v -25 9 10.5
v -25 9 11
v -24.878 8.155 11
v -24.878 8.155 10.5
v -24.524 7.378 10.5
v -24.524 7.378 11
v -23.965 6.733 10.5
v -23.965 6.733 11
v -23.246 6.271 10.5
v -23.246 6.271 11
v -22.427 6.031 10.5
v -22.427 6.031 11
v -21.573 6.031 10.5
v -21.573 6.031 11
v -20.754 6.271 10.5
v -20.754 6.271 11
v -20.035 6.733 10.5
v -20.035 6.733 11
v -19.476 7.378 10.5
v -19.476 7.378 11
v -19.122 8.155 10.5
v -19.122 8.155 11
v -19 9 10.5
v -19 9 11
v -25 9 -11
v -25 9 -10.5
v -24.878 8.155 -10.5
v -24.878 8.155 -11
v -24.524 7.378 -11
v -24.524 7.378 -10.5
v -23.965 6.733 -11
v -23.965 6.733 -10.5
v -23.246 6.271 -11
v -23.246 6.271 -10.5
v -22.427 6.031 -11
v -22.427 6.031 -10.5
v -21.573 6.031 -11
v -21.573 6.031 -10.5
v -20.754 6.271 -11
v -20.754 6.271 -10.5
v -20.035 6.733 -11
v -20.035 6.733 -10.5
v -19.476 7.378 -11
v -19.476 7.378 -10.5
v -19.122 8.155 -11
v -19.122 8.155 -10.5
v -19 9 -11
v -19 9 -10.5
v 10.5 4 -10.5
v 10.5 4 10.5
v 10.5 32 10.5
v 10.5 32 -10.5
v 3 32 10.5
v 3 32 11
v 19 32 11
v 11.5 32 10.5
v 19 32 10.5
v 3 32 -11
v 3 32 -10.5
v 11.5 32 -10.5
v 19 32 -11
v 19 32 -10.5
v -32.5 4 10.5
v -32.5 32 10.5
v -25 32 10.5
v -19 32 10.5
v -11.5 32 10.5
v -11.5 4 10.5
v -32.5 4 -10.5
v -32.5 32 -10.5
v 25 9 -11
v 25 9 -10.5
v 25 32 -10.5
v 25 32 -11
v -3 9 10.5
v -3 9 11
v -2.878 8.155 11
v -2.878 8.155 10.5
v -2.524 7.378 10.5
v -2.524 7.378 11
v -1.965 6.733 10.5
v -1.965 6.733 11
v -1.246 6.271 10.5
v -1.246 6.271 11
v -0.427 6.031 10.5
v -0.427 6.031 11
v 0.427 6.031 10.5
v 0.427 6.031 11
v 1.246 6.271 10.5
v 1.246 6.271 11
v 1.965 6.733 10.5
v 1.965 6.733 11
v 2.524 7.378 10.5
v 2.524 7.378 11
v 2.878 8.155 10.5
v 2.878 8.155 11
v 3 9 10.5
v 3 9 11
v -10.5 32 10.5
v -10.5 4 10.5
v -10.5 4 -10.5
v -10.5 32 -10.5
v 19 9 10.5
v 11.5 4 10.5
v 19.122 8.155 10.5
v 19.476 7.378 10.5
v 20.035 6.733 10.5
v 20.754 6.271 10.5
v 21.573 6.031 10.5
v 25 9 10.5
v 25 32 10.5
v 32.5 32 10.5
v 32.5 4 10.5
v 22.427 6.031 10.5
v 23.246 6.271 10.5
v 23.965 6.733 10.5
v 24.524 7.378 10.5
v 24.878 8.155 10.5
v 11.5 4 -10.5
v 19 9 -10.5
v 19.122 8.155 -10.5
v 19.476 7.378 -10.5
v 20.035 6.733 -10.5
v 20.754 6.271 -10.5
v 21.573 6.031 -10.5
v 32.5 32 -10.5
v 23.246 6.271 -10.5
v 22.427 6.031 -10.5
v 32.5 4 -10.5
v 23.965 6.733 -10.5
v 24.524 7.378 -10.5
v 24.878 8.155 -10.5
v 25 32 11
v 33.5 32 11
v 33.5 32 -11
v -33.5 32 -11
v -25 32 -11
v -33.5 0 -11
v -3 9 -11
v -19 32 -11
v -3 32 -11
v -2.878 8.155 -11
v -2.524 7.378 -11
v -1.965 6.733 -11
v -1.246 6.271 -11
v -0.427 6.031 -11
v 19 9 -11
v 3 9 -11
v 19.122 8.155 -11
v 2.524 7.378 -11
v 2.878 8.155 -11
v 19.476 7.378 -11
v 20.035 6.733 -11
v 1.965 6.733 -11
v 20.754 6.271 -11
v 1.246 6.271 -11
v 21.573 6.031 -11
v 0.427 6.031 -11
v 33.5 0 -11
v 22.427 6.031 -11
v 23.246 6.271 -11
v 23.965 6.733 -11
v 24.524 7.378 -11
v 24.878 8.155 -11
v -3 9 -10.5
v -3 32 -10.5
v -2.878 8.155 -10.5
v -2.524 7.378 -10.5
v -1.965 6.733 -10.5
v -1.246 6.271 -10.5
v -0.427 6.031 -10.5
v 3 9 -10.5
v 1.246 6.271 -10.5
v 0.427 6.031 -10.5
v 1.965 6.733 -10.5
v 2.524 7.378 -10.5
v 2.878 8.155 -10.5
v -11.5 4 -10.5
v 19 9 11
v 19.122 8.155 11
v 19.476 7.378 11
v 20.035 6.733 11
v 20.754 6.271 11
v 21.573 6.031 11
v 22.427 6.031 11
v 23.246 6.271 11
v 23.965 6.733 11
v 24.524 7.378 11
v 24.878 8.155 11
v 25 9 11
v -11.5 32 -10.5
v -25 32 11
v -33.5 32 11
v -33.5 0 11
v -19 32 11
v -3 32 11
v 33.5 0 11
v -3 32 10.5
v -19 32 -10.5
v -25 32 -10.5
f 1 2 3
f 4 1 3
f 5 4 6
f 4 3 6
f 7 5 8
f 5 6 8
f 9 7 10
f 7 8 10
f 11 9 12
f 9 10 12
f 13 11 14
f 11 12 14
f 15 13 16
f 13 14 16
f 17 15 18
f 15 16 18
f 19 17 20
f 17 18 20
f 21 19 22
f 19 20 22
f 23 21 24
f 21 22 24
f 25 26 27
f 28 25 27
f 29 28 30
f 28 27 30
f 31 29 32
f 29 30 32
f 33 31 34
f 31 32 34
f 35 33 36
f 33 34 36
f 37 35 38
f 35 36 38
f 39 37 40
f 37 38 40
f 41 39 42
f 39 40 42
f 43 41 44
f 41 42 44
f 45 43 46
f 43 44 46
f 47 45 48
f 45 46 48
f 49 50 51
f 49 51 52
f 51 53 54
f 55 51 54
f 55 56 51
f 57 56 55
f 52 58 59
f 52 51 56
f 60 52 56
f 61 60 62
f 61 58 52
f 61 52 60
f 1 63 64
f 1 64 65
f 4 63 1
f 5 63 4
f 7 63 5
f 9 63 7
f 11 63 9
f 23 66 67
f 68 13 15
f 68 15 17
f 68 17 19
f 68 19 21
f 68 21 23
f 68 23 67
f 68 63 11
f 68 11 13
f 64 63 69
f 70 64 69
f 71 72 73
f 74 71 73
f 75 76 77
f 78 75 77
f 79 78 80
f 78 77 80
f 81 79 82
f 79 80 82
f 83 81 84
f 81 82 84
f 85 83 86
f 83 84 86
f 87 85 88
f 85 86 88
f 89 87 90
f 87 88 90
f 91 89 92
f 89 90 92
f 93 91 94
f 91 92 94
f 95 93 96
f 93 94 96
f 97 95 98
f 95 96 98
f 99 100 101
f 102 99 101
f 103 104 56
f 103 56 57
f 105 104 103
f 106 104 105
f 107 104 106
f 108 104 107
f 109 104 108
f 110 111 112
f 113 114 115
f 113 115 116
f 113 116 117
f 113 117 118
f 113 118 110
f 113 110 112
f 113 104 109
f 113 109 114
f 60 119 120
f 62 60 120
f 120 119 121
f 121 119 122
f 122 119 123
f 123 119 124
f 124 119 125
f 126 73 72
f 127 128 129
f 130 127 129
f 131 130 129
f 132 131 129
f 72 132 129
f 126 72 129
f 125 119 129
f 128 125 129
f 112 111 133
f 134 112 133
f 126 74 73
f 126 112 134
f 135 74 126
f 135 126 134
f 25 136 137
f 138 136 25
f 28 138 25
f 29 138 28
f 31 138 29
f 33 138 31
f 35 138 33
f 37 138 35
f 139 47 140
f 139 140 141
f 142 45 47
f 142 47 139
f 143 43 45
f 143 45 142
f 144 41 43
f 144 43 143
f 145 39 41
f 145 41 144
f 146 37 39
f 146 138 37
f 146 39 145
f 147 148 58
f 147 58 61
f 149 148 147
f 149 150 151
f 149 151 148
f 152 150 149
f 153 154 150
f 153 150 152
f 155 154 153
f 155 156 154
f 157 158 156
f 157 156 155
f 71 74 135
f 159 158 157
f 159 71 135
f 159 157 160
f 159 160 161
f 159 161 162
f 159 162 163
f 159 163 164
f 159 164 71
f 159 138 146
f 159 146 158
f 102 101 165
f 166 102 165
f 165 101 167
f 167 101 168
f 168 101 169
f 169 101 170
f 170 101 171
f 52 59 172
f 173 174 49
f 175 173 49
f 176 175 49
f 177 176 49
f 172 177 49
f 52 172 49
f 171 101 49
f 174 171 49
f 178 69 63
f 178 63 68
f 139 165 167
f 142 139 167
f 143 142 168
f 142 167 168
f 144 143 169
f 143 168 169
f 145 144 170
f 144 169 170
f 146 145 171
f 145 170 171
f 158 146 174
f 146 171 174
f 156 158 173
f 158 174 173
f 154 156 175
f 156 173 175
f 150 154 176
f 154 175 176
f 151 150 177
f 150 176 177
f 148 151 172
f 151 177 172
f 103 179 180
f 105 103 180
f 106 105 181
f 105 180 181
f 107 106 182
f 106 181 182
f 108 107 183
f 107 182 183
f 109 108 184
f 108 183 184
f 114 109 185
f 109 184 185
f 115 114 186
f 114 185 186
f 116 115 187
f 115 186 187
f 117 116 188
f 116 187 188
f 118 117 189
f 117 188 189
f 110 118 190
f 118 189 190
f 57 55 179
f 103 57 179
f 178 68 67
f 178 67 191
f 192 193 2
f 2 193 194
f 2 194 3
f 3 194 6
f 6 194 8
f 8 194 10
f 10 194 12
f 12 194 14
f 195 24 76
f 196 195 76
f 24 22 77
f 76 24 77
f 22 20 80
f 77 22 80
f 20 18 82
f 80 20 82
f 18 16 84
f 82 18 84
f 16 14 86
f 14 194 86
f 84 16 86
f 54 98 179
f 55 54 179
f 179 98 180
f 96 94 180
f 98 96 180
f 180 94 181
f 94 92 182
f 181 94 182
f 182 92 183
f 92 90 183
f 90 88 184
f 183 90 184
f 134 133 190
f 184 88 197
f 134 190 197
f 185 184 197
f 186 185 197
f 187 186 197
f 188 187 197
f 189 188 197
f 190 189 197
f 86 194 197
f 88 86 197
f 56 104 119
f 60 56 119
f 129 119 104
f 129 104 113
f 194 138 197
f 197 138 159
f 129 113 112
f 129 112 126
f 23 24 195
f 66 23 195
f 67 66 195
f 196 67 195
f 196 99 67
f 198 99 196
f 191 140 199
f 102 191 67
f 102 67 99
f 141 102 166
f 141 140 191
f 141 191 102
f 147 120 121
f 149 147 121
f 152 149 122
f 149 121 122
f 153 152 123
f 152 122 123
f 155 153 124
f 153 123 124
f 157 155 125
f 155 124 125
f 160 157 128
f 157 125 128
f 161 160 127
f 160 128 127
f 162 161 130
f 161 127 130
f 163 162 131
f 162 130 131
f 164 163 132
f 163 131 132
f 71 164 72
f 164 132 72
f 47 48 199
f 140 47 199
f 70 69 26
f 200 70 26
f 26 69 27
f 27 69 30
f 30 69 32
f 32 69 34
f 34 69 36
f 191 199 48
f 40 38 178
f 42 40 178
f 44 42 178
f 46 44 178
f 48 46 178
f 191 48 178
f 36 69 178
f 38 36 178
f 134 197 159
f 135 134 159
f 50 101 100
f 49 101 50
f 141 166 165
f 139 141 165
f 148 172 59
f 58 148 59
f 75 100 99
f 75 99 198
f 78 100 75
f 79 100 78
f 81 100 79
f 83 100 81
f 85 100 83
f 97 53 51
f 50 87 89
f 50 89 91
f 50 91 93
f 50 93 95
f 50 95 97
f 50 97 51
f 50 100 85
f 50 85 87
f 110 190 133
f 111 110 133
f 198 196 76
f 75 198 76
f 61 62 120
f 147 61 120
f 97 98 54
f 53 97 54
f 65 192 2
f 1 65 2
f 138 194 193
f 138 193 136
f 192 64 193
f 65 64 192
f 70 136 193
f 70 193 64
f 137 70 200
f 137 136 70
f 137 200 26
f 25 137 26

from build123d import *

# Parameters (mm, degrees)
CROQUIS1_W              = 67
CROQUIS1_H              = 22
CROQUIS1_W_2            = 21
CROQUIS1_H_2            = 21
SALIENTE_EXTRUIR1_DEPTH = 32
CROQUIS1_2_W            = 21
CROQUIS1_2_H            = 21
SALIENTE_EXTRUIR2_DEPTH = 4
CORTAR_EXTRUIR1_DEPTH   = 52.285962992


with BuildPart() as part:
    # Croquis1 → Saliente-Extruir1 (new body)
    with BuildSketch(Plane(origin=(0, 0, 0), x_dir=(1, 0, 0), z_dir=(0, 1, 0))):
        Rectangle(CROQUIS1_W, CROQUIS1_H)
        Rectangle(CROQUIS1_W_2, CROQUIS1_H_2, mode=Mode.SUBTRACT)
        with Locations((-22, 0)):
            Rectangle(CROQUIS1_W_2, CROQUIS1_H_2, mode=Mode.SUBTRACT)
        with Locations((22, 0)):
            Rectangle(CROQUIS1_W_2, CROQUIS1_H_2, mode=Mode.SUBTRACT)
    extrude(amount=SALIENTE_EXTRUIR1_DEPTH)

    # Croquis1<2> → Saliente-Extruir2 (add)
    with BuildSketch(Plane(origin=(0, 0, 0), x_dir=(1, 0, 0), z_dir=(0, 1, 0))):
        Rectangle(CROQUIS1_2_W, CROQUIS1_2_H)
        with Locations((-22, 0)):
            Rectangle(CROQUIS1_2_W, CROQUIS1_2_H)
        with Locations((22, 0)):
            Rectangle(CROQUIS1_2_W, CROQUIS1_2_H)
    extrude(amount=SALIENTE_EXTRUIR2_DEPTH)

    # Croquis2 → Cortar-Extruir1 (cut, through all)
    with BuildSketch(Plane.XY.offset(11)):
        with BuildLine():
            Line((-25, 32), (-25, 9))
            ThreePointArc((-25, 9), (-22, 6), (-19, 9))
            Line((-19, 9), (-19, 32))
            Line((-19, 32), (-25, 32))
        make_face()
        with BuildLine():
            Line((-3, 32), (-3, 9))
            ThreePointArc((-3, 9), (0, 6), (3, 9))
            Line((3, 9), (3, 32))
            Line((3, 32), (-3, 32))
        make_face()
        with BuildLine():
            Line((19, 32), (19, 9))
            ThreePointArc((19, 9), (22, 6), (25, 9))
            Line((25, 9), (25, 32))
            Line((25, 32), (19, 32))
        make_face()
    extrude(amount=-CORTAR_EXTRUIR1_DEPTH, mode=Mode.SUBTRACT)


solid = part.part
